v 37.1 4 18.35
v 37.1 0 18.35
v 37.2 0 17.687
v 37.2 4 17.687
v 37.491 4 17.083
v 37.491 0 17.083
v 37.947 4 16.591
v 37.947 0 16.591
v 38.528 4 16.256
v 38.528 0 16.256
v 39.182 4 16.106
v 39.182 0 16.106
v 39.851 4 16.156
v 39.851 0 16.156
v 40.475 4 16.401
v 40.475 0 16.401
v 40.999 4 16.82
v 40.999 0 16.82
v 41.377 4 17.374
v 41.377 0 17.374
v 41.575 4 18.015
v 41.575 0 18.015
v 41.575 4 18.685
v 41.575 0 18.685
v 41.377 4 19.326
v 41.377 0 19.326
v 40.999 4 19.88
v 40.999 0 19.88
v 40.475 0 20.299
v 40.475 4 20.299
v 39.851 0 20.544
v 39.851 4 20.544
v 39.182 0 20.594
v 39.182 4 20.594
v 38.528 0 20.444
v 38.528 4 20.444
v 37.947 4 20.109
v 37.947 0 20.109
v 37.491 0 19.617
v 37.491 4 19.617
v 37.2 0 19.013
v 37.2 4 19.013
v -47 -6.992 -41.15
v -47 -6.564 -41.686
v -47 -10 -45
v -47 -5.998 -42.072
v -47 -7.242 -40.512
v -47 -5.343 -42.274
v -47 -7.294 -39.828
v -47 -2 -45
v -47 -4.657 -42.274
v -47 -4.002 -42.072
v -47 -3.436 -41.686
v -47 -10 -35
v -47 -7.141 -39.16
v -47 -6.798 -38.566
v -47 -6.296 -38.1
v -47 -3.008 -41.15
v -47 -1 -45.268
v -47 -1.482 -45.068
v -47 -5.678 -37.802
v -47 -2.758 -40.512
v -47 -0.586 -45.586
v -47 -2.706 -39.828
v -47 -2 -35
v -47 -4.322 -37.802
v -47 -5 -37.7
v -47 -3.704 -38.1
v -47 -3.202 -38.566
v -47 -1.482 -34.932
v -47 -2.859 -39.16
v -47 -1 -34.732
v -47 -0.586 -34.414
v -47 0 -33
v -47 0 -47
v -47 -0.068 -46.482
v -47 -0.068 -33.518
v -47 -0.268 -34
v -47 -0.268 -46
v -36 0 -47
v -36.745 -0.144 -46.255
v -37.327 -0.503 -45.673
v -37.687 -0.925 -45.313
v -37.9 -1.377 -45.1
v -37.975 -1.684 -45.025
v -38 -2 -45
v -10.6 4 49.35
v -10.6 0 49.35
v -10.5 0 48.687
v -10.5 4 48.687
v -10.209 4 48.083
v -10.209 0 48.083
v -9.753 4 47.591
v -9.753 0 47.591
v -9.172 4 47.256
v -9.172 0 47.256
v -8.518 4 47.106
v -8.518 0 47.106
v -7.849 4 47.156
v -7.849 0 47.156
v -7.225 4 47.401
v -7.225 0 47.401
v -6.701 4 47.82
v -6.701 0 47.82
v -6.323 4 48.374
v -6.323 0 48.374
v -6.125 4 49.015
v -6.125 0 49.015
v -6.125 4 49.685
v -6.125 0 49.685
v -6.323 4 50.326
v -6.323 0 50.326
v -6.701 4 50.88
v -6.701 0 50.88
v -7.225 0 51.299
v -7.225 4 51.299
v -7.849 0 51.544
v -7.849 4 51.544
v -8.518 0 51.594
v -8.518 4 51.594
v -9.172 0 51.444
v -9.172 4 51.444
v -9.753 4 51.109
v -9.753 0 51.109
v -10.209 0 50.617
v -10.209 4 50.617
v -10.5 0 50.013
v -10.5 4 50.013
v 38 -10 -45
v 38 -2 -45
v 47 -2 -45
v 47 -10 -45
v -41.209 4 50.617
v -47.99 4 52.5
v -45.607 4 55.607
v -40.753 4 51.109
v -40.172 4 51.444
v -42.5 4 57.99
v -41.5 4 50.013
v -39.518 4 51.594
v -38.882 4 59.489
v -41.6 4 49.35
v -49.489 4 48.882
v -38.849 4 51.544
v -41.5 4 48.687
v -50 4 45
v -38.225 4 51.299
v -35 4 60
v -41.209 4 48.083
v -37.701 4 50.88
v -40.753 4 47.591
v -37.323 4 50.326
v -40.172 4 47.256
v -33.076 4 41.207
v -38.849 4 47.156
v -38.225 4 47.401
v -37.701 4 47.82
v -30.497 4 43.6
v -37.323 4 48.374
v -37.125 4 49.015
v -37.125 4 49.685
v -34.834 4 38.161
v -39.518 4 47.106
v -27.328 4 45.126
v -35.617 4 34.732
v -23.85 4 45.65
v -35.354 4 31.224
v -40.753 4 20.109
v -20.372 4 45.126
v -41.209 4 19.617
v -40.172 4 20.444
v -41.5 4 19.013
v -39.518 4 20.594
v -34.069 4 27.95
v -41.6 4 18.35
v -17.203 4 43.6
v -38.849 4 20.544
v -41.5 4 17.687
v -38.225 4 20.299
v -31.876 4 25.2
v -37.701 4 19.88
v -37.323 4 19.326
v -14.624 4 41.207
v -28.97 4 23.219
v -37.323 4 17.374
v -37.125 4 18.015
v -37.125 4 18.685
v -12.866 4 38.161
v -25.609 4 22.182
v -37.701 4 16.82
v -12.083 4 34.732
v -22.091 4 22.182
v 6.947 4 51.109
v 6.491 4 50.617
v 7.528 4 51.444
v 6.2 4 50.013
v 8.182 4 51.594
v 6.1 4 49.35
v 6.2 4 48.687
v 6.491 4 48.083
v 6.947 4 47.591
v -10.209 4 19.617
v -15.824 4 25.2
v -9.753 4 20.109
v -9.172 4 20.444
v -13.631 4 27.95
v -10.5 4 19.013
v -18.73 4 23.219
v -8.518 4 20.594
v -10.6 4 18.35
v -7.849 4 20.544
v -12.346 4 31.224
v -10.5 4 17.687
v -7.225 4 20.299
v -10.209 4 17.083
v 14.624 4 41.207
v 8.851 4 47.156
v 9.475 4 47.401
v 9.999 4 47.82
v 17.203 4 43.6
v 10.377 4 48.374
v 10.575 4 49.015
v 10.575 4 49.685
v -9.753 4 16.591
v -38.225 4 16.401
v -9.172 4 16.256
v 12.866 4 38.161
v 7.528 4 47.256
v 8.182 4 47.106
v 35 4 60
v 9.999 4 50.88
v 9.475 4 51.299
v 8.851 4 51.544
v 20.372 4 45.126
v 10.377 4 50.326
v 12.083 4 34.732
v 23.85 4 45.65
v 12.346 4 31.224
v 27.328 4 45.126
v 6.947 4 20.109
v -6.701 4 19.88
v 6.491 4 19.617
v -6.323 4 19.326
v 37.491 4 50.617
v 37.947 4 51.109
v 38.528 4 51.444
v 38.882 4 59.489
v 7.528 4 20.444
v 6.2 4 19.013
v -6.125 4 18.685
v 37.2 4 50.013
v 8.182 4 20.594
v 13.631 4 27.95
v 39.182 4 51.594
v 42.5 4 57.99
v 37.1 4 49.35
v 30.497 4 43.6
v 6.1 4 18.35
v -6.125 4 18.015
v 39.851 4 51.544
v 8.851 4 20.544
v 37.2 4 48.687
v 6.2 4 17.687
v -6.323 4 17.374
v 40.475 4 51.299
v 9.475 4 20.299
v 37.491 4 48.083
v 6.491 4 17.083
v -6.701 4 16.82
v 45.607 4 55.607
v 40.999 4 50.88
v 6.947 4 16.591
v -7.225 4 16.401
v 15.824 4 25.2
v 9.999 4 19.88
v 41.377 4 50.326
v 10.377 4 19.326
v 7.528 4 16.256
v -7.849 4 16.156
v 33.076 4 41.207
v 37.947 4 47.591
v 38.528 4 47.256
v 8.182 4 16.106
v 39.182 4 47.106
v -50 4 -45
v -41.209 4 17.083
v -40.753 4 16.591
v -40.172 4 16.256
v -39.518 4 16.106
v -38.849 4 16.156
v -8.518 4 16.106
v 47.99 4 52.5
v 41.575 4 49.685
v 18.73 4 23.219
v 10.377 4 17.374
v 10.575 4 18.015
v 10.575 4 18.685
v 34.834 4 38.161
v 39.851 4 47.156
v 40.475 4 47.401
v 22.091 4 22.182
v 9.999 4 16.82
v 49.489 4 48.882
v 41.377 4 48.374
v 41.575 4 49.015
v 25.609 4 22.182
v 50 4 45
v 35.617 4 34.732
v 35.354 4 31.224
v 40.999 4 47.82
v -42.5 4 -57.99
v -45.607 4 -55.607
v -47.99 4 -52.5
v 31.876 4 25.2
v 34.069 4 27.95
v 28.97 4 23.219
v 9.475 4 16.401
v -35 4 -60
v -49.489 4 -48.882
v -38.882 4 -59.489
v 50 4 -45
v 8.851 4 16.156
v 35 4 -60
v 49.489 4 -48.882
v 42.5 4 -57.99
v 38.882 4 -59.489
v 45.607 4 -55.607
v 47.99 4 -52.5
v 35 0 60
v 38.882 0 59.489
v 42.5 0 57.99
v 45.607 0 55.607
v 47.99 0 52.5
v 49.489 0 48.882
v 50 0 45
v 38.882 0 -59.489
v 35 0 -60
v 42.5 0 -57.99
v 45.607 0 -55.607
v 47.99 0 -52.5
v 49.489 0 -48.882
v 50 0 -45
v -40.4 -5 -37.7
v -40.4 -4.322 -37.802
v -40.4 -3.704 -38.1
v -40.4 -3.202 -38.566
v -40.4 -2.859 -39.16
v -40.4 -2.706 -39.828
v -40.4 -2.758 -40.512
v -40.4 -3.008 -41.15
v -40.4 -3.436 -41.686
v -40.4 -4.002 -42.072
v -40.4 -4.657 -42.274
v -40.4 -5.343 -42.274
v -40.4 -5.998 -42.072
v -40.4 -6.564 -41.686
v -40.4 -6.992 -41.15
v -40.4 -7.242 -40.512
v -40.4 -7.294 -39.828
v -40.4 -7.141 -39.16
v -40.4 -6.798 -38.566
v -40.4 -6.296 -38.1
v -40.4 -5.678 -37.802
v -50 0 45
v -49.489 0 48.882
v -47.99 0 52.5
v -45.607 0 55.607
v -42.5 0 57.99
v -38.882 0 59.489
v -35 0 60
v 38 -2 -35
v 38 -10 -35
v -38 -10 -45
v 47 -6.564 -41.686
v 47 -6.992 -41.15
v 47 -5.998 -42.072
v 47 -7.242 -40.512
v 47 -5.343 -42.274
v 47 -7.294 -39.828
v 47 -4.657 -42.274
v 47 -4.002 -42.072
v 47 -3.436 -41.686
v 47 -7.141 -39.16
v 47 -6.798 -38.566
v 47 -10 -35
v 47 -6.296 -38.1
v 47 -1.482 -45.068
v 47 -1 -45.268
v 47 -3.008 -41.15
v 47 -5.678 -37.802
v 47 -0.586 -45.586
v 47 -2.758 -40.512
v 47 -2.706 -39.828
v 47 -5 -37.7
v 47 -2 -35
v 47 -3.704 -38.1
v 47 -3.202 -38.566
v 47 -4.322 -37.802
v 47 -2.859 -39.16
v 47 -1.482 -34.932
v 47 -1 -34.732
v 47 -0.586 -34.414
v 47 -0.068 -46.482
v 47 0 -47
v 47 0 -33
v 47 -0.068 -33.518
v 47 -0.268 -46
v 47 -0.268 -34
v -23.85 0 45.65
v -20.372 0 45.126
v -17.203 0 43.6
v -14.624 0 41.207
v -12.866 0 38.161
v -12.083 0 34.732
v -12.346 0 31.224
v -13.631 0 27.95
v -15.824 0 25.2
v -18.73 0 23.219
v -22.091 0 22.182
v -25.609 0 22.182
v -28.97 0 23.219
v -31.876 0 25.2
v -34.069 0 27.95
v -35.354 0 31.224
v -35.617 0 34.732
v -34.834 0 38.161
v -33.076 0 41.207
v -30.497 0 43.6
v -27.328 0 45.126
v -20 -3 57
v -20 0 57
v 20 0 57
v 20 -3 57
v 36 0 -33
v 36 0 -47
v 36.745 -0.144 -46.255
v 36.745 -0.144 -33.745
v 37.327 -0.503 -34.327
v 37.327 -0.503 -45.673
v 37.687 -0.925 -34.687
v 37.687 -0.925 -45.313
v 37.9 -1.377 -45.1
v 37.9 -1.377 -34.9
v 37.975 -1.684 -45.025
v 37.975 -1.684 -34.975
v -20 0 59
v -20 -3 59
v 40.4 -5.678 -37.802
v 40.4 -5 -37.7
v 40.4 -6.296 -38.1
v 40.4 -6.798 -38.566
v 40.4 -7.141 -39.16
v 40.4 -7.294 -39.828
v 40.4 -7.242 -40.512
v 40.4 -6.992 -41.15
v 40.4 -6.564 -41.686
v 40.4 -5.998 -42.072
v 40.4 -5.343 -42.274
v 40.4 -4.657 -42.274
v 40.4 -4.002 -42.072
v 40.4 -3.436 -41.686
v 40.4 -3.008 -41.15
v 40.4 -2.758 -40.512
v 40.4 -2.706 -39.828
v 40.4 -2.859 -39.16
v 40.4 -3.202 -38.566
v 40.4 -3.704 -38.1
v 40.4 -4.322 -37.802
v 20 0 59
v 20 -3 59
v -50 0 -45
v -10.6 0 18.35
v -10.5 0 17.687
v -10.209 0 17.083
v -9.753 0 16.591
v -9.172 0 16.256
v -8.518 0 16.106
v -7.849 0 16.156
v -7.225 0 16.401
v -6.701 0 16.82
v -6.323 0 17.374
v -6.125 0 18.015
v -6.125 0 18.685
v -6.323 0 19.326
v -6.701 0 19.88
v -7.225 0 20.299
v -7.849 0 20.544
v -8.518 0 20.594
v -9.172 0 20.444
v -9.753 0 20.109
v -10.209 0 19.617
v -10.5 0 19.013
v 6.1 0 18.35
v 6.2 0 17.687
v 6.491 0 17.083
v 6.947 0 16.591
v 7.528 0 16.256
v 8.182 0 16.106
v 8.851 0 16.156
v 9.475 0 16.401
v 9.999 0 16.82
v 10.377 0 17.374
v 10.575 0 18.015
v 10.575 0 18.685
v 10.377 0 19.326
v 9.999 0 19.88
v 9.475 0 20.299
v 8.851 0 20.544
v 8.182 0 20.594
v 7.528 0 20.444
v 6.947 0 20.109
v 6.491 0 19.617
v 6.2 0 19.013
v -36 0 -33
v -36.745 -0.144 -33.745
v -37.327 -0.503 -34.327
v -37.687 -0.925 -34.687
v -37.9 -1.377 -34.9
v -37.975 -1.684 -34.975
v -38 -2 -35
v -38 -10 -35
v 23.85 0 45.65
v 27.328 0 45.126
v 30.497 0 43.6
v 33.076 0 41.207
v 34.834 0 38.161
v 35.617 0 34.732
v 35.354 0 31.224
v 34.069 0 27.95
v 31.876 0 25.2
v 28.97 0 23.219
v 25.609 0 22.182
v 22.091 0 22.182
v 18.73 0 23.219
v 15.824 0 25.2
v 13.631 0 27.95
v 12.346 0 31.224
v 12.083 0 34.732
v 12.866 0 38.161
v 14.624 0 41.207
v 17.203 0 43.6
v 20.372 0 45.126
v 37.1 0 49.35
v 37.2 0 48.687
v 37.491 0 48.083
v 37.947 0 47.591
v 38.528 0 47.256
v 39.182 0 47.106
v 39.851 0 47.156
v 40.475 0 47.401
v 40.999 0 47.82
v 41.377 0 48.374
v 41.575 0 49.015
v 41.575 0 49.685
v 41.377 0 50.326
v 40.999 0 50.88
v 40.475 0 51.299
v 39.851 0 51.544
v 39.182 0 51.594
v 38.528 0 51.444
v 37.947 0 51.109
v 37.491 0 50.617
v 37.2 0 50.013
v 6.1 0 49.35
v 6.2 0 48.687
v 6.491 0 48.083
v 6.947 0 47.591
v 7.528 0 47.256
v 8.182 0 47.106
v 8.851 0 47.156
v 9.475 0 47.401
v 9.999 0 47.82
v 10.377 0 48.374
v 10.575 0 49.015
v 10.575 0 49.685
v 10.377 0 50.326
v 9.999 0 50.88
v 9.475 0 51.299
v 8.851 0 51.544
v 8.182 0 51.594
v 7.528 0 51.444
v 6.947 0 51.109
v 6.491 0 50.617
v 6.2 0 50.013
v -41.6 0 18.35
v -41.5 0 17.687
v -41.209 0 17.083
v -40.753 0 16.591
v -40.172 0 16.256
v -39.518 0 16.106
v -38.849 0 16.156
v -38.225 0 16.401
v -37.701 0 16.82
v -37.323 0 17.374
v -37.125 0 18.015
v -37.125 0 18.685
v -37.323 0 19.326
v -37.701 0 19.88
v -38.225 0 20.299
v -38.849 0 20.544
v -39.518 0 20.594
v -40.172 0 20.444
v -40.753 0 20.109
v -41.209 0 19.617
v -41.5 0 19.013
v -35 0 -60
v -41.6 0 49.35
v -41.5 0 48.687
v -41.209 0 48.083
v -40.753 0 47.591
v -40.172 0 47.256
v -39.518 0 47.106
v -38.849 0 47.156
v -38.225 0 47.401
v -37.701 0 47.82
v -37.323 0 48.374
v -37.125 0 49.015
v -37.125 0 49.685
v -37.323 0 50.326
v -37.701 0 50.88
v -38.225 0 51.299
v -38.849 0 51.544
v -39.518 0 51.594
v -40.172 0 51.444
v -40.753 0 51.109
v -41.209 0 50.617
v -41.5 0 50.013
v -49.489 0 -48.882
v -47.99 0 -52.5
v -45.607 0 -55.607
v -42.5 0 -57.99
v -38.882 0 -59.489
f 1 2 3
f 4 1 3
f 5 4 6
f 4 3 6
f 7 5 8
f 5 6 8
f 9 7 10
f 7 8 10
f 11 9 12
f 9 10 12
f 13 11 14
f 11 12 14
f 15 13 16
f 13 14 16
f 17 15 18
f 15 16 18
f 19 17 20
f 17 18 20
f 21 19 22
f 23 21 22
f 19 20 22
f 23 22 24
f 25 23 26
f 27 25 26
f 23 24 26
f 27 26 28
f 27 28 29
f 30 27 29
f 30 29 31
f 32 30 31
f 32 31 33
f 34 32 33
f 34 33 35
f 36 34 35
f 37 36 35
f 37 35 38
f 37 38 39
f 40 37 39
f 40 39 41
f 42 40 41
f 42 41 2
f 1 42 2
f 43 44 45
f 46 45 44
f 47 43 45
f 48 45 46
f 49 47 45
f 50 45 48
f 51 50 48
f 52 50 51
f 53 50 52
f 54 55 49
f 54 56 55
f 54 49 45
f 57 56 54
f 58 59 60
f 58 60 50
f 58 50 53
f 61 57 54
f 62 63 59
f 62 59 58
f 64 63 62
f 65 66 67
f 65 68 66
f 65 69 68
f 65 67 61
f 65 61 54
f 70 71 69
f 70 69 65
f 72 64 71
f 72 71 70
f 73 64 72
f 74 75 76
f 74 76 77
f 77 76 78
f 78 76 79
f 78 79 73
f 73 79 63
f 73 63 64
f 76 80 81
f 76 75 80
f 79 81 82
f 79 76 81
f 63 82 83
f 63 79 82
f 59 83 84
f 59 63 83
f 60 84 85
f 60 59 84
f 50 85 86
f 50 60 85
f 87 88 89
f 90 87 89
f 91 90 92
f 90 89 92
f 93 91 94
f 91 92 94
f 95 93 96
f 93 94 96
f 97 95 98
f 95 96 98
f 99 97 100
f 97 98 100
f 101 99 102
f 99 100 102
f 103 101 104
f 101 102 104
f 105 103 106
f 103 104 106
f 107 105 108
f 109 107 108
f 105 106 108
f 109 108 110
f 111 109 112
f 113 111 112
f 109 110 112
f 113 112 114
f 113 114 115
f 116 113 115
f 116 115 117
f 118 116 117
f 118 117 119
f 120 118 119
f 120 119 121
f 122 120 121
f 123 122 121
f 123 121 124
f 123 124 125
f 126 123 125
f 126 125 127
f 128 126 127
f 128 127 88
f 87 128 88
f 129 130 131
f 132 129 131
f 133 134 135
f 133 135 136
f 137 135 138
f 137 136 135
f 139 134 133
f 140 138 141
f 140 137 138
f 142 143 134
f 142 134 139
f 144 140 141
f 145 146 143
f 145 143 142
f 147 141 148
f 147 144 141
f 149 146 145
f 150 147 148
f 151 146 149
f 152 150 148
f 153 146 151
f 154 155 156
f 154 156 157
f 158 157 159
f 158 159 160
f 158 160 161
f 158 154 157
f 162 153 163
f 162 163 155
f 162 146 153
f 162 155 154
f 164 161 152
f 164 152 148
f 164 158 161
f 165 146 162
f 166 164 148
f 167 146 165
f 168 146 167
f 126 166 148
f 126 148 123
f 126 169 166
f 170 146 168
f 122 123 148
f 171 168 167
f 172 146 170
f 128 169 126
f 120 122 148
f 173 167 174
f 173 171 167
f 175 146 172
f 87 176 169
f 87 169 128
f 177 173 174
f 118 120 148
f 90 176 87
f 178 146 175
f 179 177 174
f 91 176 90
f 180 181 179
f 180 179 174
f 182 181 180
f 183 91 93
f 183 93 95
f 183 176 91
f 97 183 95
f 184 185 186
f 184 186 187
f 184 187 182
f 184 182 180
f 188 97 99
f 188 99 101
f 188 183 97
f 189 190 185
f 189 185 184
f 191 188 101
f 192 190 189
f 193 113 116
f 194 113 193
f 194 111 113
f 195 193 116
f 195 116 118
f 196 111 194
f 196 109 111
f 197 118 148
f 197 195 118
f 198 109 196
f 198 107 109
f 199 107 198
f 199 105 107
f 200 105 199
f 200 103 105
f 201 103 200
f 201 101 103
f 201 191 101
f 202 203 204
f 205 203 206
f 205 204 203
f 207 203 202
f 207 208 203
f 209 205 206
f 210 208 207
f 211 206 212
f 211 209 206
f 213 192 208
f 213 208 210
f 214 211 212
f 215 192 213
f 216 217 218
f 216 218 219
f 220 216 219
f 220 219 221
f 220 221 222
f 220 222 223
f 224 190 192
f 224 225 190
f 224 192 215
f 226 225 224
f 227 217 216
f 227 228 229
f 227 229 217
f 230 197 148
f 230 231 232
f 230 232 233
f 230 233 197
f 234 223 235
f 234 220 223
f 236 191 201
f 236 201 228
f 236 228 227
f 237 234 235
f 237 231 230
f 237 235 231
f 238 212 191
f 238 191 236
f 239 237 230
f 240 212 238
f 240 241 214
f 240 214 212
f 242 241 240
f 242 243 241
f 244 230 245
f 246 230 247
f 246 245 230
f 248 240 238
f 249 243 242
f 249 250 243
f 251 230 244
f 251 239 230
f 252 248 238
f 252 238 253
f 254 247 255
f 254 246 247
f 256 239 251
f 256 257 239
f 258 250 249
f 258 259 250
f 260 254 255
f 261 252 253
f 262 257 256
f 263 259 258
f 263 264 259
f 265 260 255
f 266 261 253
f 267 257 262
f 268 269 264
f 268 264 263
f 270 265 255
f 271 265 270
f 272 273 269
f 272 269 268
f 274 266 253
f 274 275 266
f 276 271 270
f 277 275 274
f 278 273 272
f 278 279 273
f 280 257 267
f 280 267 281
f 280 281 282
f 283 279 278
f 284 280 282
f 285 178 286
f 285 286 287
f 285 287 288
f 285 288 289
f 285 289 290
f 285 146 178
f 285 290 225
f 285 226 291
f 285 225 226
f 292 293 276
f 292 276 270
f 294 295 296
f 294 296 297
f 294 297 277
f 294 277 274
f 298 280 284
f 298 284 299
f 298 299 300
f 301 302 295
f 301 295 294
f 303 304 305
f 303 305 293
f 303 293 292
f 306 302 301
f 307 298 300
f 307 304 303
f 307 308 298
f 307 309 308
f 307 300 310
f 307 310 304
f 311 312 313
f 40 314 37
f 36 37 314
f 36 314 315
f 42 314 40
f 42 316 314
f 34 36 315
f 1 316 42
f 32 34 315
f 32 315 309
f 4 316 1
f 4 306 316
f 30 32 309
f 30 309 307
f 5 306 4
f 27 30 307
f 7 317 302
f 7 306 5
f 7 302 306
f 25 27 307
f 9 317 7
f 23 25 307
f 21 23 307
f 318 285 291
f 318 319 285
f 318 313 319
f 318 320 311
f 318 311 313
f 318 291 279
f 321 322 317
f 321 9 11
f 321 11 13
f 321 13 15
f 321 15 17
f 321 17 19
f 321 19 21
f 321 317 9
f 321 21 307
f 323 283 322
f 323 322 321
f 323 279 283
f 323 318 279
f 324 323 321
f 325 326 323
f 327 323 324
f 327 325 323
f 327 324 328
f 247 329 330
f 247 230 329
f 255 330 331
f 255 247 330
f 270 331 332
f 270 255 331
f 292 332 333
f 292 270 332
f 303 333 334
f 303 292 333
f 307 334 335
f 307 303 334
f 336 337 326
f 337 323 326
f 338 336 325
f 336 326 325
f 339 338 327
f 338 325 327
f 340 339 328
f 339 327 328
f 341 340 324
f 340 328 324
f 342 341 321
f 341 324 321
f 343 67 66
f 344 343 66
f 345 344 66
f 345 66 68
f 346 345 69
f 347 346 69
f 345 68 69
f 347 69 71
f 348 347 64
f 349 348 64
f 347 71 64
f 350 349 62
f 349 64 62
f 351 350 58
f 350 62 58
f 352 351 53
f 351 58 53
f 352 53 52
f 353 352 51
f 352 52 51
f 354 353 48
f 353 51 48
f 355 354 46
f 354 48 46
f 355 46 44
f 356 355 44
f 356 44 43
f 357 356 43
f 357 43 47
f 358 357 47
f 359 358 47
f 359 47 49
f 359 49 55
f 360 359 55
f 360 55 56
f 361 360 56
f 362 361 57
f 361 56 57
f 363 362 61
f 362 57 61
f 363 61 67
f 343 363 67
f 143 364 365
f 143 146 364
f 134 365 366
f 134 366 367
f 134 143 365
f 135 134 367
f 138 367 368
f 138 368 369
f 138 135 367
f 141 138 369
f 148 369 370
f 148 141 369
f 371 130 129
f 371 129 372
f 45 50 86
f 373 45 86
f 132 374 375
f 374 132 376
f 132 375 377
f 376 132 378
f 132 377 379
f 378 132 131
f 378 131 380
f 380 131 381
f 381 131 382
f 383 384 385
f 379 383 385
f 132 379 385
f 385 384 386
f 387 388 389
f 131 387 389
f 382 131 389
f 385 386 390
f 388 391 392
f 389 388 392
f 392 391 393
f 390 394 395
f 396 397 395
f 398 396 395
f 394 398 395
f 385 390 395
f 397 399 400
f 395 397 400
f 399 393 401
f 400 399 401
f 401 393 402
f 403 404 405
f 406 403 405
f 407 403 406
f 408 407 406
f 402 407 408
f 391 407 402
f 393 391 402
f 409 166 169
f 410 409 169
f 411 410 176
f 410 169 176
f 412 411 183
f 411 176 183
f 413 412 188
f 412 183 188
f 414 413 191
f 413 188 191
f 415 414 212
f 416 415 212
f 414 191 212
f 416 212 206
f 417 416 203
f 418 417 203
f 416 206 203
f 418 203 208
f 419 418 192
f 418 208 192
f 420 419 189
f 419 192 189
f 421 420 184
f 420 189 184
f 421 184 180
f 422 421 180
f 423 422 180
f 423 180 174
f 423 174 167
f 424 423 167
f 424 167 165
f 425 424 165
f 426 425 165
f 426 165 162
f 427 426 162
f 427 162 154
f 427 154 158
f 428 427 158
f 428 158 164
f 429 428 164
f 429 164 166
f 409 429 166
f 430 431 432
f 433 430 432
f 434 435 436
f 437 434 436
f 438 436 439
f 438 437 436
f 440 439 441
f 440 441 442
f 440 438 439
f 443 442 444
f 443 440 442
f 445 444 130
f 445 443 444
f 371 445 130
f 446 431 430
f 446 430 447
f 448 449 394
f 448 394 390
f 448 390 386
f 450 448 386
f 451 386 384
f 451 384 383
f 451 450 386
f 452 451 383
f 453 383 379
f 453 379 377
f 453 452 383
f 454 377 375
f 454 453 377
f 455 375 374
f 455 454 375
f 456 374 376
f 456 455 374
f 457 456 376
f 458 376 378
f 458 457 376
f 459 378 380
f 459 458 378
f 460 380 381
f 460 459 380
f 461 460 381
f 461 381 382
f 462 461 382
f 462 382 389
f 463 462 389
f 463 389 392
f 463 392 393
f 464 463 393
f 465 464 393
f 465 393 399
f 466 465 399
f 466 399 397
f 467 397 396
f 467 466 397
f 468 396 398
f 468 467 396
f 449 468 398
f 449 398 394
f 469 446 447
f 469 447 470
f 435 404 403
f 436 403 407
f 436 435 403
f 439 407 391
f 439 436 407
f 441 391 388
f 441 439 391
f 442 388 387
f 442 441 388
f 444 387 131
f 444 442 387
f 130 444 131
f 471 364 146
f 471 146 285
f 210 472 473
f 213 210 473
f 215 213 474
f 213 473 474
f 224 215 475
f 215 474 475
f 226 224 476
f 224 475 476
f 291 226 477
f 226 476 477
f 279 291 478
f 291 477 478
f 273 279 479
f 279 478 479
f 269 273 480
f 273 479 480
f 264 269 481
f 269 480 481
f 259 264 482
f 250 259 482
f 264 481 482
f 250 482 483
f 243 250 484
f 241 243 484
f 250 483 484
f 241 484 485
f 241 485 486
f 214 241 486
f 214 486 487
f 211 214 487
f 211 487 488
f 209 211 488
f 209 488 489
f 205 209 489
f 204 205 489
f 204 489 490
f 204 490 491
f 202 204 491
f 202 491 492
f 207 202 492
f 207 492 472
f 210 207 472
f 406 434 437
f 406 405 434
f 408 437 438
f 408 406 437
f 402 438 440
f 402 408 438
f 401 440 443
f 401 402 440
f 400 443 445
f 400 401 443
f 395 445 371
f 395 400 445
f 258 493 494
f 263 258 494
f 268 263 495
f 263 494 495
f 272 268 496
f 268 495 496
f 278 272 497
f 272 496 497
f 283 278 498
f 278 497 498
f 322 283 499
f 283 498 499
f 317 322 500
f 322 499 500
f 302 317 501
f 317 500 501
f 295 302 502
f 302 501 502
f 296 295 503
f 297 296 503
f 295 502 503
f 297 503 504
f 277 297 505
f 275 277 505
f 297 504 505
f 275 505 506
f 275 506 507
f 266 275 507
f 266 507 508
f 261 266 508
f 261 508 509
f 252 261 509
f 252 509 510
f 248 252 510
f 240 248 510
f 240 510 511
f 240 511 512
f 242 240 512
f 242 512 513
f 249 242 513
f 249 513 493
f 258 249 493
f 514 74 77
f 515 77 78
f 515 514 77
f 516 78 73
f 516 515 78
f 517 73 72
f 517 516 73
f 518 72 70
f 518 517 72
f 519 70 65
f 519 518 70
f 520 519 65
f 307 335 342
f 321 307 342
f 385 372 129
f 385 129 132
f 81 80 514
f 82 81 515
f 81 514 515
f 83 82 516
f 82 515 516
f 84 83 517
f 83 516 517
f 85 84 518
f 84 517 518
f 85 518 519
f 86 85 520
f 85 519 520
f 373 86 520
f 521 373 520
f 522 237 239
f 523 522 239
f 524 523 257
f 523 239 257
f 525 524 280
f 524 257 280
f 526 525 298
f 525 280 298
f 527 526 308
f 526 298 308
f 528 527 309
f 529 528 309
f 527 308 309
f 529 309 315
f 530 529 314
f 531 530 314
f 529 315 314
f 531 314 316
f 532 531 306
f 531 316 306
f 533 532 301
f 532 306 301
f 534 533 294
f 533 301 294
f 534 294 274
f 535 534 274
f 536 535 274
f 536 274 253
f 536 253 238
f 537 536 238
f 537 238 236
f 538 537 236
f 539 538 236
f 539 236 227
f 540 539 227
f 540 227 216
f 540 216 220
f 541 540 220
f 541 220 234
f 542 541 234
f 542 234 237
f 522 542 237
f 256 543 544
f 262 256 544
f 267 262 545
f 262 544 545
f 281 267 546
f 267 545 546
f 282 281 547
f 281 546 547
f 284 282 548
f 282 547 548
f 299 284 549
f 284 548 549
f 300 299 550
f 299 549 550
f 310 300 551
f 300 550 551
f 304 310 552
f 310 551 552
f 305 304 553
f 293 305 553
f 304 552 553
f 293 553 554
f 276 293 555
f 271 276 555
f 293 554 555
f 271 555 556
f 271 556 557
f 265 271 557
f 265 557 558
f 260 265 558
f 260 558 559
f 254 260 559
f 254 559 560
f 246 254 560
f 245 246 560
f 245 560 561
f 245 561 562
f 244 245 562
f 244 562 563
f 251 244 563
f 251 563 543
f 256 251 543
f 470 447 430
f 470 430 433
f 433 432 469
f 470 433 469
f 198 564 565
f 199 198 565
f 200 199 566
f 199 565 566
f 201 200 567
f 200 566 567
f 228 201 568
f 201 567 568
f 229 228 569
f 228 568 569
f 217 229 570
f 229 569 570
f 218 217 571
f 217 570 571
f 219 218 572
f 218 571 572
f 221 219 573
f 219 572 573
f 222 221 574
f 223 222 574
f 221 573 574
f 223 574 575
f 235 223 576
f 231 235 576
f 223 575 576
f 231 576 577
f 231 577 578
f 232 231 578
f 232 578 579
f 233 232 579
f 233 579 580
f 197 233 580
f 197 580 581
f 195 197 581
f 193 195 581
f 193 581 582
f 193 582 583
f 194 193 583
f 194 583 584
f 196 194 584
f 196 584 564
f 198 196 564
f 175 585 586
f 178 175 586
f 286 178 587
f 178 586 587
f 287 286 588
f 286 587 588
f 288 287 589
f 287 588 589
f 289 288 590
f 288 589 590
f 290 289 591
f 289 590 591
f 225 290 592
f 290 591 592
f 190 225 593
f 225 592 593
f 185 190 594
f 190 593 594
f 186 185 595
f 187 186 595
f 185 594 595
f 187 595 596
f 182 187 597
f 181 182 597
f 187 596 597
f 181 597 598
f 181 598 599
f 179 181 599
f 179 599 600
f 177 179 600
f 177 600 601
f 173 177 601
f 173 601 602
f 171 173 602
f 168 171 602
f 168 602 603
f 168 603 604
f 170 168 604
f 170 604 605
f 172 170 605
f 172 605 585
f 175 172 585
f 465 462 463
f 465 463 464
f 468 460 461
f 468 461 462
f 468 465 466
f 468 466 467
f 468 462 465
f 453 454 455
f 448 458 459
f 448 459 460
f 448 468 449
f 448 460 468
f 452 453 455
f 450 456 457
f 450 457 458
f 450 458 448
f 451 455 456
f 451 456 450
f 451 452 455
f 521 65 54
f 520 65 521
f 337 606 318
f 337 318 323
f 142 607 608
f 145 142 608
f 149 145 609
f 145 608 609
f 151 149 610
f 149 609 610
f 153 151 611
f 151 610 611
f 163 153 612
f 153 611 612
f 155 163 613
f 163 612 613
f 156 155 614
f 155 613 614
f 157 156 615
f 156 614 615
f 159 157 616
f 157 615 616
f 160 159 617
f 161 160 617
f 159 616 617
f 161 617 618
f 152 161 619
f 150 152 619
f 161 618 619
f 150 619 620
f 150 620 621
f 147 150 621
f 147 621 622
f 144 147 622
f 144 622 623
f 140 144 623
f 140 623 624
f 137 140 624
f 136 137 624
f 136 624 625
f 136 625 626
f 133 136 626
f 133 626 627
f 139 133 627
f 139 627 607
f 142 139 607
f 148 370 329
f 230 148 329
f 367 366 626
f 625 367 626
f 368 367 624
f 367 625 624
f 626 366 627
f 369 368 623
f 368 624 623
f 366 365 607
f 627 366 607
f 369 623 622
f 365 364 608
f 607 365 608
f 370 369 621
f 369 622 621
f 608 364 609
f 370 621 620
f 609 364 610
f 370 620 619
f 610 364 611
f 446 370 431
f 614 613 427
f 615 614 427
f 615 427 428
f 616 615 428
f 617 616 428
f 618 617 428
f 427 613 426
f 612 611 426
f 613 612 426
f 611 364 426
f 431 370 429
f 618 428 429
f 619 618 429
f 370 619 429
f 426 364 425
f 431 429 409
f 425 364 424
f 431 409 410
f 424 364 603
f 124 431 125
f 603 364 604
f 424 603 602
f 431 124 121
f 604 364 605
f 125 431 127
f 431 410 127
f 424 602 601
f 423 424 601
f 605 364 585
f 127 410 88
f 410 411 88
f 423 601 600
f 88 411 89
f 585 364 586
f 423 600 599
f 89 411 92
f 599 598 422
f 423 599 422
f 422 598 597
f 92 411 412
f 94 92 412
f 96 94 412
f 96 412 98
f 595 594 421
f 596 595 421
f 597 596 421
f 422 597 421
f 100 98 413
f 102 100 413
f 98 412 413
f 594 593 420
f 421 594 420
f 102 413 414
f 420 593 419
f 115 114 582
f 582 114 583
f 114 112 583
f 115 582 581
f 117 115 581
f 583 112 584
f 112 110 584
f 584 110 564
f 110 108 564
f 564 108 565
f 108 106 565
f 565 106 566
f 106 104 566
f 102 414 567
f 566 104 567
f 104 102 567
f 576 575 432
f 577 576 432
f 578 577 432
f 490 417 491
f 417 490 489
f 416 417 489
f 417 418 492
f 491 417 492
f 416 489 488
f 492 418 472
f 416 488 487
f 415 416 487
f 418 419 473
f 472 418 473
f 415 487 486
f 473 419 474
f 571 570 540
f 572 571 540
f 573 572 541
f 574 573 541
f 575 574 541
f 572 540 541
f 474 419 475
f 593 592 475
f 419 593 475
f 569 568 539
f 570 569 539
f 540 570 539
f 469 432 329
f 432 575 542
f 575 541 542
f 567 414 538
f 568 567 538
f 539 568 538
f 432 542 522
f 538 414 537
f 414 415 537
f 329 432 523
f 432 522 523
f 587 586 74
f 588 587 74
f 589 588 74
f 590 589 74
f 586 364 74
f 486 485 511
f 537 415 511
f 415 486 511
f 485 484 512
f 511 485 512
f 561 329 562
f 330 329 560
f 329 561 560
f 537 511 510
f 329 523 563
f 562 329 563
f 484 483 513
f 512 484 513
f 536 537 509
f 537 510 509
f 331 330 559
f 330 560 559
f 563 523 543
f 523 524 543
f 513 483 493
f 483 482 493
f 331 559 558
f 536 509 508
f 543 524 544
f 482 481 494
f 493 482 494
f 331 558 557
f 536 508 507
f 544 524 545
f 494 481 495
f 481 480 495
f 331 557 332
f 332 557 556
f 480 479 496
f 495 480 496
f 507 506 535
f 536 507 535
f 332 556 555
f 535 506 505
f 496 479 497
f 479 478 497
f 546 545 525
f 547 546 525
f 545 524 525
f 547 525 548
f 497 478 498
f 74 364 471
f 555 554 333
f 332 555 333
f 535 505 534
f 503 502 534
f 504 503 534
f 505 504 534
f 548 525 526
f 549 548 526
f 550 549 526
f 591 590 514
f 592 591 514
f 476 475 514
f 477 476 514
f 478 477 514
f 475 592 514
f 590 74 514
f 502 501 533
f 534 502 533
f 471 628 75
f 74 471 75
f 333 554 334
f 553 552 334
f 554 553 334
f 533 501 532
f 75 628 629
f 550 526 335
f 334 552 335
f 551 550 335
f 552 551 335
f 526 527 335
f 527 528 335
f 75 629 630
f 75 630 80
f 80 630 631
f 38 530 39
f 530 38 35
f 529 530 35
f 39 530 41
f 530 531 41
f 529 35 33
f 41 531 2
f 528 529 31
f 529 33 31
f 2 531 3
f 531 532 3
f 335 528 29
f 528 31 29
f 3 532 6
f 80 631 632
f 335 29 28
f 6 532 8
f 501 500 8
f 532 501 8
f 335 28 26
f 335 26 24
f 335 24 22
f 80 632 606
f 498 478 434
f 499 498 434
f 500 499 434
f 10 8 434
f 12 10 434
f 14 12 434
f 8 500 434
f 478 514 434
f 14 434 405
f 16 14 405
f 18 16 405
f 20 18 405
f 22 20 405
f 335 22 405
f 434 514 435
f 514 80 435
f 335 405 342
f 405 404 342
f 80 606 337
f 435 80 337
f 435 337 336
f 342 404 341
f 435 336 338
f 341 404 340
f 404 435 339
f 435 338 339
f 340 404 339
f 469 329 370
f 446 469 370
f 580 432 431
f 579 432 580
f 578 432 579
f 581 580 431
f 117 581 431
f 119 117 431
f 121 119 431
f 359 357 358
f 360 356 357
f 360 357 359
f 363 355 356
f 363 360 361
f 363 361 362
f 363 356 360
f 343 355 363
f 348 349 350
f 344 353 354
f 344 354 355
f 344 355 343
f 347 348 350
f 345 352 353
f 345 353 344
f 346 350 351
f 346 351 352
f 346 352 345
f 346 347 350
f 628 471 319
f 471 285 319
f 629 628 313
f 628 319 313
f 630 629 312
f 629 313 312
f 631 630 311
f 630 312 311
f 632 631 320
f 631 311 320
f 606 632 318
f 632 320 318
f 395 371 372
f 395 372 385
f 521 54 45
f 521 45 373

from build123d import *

# Parameters (mm, degrees)
SKETCH3_W            = 100
SKETCH3_H            = 120
BOSS_EXTRUDE3_DEPTH  = 4
M4_CLEARANCE_HOLE1_D = 4.5
SKETCH5_R            = 11.8
CUT_EXTRUDE3_DEPTH   = 79.204859184
FILLET1_R            = 15
SKETCH23_W           = 9
SKETCH23_H           = 10
BOSS_EXTRUDE5_DEPTH  = 10
SKETCH26_W           = 40
SKETCH26_H           = 2
BOSS_EXTRUDE6_DEPTH  = 3
SKETCH27_R           = 2.3
CUT_EXTRUDE4_DEPTH   = 6.6
CUT_EXTRUDE5_START   = -6.6
SKETCH28_R           = 2.3
CUT_EXTRUDE5_DEPTH   = 6.6
FILLET2_R            = 2
FILLET3_R            = 2
FILLET4_R            = 2
FILLET5_R            = 2
FILLET6_R            = 2
FILLET7_R            = 2


with BuildPart() as part:
    # Sketch3 → Boss-Extrude3 (new body)
    with BuildSketch(Plane(origin=(0, 0, 0), x_dir=(1, 0, 0), z_dir=(0, 1, 0))):
        Rectangle(SKETCH3_W, SKETCH3_H)
    extrude(amount=BOSS_EXTRUDE3_DEPTH)

    # M4 Clearance Hole1 (through all)
    with Locations(Plane(origin=(0, 4, 0), x_dir=(1, 0, 0), z_dir=(0, 1, 0))):
        with Locations((-8.35, -18.35), (-39.35, -18.35), (-39.35, -49.35), (-8.35, -49.35), (8.35, -18.35), (39.35, -18.35), (39.35, -49.35), (8.35, -49.35)):
            Hole(M4_CLEARANCE_HOLE1_D / 2)

    # Sketch5 → Cut-Extrude3 (cut, through all)
    with BuildSketch(Plane(origin=(0, 4, 0), x_dir=(1, 0, 0), z_dir=(0, 1, 0))):
        with Locations(Location((-23.85, -33.85, 0), (0, 0, 270))):
            Circle(SKETCH5_R)
        with Locations(Location((23.85, -33.85, 0), (0, 0, 270))):
            Circle(SKETCH5_R)
    extrude(amount=-CUT_EXTRUDE3_DEPTH, mode=Mode.SUBTRACT)

    # Fillet1
    fillet1_edges = [part.edges().sort_by_distance(p)[0] for p in [
        (50, 2, 60),
        (-50, 2, 60),
        (-50, 2, -60),
        (50, 2, -60),
    ]]
    fillet(fillet1_edges, radius=FILLET1_R)

    # Sketch23 → Boss-Extrude5 (add)
    with BuildSketch(Plane.XZ):
        with Locations((-42.5, -40)):
            Rectangle(SKETCH23_W, SKETCH23_H)
        with Locations((42.5, -40)):
            Rectangle(SKETCH23_W, SKETCH23_H)
    extrude(amount=BOSS_EXTRUDE5_DEPTH)

    # Sketch26 → Boss-Extrude6 (add)
    with BuildSketch(Plane.XZ):
        with Locations((0, 58)):
            Rectangle(SKETCH26_W, SKETCH26_H)
    extrude(amount=BOSS_EXTRUDE6_DEPTH)

    # Sketch27 → Cut-Extrude4 (cut)
    with BuildSketch(Plane.ZY.offset(47)):
        with Locations((-40, -5)):
            Circle(SKETCH27_R)
    extrude(amount=-CUT_EXTRUDE4_DEPTH, mode=Mode.SUBTRACT)

    # Sketch28 → Cut-Extrude5 (cut)
    with BuildSketch(Plane(origin=(47, 0, 0), x_dir=(0, 0, -1), z_dir=(1, 0, 0)).offset(CUT_EXTRUDE5_START)):
        with Locations(Location((40, -5, 0), (0, 0, 180))):
            Circle(SKETCH28_R)
    extrude(amount=CUT_EXTRUDE5_DEPTH, mode=Mode.SUBTRACT)

    # Fillet2
    fillet2_edges = [part.edges().sort_by_distance(p)[0] for p in [
        (38, 0, -40),
    ]]
    fillet(fillet2_edges, radius=FILLET2_R)

    # Fillet3
    fillet3_edges = [part.edges().sort_by_distance(p)[0] for p in [
        (-38, 0, -40),
    ]]
    fillet(fillet3_edges, radius=FILLET3_R)

    # Fillet4
    fillet4_edges = [part.edges().sort_by_distance(p)[0] for p in [
        (41.5, 0, -35),
    ]]
    fillet(fillet4_edges, radius=FILLET4_R)

    # Fillet5
    fillet5_edges = [part.edges().sort_by_distance(p)[0] for p in [
        (-41.5, 0, -35),
    ]]
    fillet(fillet5_edges, radius=FILLET5_R)

    # Fillet6
    fillet6_edges = [part.edges().sort_by_distance(p)[0] for p in [
        (41.5, 0, -45),
    ]]
    fillet(fillet6_edges, radius=FILLET6_R)

    # Fillet7
    fillet7_edges = [part.edges().sort_by_distance(p)[0] for p in [
        (-41.5, 0, -45),
    ]]
    fillet(fillet7_edges, radius=FILLET7_R)


solid = part.part
